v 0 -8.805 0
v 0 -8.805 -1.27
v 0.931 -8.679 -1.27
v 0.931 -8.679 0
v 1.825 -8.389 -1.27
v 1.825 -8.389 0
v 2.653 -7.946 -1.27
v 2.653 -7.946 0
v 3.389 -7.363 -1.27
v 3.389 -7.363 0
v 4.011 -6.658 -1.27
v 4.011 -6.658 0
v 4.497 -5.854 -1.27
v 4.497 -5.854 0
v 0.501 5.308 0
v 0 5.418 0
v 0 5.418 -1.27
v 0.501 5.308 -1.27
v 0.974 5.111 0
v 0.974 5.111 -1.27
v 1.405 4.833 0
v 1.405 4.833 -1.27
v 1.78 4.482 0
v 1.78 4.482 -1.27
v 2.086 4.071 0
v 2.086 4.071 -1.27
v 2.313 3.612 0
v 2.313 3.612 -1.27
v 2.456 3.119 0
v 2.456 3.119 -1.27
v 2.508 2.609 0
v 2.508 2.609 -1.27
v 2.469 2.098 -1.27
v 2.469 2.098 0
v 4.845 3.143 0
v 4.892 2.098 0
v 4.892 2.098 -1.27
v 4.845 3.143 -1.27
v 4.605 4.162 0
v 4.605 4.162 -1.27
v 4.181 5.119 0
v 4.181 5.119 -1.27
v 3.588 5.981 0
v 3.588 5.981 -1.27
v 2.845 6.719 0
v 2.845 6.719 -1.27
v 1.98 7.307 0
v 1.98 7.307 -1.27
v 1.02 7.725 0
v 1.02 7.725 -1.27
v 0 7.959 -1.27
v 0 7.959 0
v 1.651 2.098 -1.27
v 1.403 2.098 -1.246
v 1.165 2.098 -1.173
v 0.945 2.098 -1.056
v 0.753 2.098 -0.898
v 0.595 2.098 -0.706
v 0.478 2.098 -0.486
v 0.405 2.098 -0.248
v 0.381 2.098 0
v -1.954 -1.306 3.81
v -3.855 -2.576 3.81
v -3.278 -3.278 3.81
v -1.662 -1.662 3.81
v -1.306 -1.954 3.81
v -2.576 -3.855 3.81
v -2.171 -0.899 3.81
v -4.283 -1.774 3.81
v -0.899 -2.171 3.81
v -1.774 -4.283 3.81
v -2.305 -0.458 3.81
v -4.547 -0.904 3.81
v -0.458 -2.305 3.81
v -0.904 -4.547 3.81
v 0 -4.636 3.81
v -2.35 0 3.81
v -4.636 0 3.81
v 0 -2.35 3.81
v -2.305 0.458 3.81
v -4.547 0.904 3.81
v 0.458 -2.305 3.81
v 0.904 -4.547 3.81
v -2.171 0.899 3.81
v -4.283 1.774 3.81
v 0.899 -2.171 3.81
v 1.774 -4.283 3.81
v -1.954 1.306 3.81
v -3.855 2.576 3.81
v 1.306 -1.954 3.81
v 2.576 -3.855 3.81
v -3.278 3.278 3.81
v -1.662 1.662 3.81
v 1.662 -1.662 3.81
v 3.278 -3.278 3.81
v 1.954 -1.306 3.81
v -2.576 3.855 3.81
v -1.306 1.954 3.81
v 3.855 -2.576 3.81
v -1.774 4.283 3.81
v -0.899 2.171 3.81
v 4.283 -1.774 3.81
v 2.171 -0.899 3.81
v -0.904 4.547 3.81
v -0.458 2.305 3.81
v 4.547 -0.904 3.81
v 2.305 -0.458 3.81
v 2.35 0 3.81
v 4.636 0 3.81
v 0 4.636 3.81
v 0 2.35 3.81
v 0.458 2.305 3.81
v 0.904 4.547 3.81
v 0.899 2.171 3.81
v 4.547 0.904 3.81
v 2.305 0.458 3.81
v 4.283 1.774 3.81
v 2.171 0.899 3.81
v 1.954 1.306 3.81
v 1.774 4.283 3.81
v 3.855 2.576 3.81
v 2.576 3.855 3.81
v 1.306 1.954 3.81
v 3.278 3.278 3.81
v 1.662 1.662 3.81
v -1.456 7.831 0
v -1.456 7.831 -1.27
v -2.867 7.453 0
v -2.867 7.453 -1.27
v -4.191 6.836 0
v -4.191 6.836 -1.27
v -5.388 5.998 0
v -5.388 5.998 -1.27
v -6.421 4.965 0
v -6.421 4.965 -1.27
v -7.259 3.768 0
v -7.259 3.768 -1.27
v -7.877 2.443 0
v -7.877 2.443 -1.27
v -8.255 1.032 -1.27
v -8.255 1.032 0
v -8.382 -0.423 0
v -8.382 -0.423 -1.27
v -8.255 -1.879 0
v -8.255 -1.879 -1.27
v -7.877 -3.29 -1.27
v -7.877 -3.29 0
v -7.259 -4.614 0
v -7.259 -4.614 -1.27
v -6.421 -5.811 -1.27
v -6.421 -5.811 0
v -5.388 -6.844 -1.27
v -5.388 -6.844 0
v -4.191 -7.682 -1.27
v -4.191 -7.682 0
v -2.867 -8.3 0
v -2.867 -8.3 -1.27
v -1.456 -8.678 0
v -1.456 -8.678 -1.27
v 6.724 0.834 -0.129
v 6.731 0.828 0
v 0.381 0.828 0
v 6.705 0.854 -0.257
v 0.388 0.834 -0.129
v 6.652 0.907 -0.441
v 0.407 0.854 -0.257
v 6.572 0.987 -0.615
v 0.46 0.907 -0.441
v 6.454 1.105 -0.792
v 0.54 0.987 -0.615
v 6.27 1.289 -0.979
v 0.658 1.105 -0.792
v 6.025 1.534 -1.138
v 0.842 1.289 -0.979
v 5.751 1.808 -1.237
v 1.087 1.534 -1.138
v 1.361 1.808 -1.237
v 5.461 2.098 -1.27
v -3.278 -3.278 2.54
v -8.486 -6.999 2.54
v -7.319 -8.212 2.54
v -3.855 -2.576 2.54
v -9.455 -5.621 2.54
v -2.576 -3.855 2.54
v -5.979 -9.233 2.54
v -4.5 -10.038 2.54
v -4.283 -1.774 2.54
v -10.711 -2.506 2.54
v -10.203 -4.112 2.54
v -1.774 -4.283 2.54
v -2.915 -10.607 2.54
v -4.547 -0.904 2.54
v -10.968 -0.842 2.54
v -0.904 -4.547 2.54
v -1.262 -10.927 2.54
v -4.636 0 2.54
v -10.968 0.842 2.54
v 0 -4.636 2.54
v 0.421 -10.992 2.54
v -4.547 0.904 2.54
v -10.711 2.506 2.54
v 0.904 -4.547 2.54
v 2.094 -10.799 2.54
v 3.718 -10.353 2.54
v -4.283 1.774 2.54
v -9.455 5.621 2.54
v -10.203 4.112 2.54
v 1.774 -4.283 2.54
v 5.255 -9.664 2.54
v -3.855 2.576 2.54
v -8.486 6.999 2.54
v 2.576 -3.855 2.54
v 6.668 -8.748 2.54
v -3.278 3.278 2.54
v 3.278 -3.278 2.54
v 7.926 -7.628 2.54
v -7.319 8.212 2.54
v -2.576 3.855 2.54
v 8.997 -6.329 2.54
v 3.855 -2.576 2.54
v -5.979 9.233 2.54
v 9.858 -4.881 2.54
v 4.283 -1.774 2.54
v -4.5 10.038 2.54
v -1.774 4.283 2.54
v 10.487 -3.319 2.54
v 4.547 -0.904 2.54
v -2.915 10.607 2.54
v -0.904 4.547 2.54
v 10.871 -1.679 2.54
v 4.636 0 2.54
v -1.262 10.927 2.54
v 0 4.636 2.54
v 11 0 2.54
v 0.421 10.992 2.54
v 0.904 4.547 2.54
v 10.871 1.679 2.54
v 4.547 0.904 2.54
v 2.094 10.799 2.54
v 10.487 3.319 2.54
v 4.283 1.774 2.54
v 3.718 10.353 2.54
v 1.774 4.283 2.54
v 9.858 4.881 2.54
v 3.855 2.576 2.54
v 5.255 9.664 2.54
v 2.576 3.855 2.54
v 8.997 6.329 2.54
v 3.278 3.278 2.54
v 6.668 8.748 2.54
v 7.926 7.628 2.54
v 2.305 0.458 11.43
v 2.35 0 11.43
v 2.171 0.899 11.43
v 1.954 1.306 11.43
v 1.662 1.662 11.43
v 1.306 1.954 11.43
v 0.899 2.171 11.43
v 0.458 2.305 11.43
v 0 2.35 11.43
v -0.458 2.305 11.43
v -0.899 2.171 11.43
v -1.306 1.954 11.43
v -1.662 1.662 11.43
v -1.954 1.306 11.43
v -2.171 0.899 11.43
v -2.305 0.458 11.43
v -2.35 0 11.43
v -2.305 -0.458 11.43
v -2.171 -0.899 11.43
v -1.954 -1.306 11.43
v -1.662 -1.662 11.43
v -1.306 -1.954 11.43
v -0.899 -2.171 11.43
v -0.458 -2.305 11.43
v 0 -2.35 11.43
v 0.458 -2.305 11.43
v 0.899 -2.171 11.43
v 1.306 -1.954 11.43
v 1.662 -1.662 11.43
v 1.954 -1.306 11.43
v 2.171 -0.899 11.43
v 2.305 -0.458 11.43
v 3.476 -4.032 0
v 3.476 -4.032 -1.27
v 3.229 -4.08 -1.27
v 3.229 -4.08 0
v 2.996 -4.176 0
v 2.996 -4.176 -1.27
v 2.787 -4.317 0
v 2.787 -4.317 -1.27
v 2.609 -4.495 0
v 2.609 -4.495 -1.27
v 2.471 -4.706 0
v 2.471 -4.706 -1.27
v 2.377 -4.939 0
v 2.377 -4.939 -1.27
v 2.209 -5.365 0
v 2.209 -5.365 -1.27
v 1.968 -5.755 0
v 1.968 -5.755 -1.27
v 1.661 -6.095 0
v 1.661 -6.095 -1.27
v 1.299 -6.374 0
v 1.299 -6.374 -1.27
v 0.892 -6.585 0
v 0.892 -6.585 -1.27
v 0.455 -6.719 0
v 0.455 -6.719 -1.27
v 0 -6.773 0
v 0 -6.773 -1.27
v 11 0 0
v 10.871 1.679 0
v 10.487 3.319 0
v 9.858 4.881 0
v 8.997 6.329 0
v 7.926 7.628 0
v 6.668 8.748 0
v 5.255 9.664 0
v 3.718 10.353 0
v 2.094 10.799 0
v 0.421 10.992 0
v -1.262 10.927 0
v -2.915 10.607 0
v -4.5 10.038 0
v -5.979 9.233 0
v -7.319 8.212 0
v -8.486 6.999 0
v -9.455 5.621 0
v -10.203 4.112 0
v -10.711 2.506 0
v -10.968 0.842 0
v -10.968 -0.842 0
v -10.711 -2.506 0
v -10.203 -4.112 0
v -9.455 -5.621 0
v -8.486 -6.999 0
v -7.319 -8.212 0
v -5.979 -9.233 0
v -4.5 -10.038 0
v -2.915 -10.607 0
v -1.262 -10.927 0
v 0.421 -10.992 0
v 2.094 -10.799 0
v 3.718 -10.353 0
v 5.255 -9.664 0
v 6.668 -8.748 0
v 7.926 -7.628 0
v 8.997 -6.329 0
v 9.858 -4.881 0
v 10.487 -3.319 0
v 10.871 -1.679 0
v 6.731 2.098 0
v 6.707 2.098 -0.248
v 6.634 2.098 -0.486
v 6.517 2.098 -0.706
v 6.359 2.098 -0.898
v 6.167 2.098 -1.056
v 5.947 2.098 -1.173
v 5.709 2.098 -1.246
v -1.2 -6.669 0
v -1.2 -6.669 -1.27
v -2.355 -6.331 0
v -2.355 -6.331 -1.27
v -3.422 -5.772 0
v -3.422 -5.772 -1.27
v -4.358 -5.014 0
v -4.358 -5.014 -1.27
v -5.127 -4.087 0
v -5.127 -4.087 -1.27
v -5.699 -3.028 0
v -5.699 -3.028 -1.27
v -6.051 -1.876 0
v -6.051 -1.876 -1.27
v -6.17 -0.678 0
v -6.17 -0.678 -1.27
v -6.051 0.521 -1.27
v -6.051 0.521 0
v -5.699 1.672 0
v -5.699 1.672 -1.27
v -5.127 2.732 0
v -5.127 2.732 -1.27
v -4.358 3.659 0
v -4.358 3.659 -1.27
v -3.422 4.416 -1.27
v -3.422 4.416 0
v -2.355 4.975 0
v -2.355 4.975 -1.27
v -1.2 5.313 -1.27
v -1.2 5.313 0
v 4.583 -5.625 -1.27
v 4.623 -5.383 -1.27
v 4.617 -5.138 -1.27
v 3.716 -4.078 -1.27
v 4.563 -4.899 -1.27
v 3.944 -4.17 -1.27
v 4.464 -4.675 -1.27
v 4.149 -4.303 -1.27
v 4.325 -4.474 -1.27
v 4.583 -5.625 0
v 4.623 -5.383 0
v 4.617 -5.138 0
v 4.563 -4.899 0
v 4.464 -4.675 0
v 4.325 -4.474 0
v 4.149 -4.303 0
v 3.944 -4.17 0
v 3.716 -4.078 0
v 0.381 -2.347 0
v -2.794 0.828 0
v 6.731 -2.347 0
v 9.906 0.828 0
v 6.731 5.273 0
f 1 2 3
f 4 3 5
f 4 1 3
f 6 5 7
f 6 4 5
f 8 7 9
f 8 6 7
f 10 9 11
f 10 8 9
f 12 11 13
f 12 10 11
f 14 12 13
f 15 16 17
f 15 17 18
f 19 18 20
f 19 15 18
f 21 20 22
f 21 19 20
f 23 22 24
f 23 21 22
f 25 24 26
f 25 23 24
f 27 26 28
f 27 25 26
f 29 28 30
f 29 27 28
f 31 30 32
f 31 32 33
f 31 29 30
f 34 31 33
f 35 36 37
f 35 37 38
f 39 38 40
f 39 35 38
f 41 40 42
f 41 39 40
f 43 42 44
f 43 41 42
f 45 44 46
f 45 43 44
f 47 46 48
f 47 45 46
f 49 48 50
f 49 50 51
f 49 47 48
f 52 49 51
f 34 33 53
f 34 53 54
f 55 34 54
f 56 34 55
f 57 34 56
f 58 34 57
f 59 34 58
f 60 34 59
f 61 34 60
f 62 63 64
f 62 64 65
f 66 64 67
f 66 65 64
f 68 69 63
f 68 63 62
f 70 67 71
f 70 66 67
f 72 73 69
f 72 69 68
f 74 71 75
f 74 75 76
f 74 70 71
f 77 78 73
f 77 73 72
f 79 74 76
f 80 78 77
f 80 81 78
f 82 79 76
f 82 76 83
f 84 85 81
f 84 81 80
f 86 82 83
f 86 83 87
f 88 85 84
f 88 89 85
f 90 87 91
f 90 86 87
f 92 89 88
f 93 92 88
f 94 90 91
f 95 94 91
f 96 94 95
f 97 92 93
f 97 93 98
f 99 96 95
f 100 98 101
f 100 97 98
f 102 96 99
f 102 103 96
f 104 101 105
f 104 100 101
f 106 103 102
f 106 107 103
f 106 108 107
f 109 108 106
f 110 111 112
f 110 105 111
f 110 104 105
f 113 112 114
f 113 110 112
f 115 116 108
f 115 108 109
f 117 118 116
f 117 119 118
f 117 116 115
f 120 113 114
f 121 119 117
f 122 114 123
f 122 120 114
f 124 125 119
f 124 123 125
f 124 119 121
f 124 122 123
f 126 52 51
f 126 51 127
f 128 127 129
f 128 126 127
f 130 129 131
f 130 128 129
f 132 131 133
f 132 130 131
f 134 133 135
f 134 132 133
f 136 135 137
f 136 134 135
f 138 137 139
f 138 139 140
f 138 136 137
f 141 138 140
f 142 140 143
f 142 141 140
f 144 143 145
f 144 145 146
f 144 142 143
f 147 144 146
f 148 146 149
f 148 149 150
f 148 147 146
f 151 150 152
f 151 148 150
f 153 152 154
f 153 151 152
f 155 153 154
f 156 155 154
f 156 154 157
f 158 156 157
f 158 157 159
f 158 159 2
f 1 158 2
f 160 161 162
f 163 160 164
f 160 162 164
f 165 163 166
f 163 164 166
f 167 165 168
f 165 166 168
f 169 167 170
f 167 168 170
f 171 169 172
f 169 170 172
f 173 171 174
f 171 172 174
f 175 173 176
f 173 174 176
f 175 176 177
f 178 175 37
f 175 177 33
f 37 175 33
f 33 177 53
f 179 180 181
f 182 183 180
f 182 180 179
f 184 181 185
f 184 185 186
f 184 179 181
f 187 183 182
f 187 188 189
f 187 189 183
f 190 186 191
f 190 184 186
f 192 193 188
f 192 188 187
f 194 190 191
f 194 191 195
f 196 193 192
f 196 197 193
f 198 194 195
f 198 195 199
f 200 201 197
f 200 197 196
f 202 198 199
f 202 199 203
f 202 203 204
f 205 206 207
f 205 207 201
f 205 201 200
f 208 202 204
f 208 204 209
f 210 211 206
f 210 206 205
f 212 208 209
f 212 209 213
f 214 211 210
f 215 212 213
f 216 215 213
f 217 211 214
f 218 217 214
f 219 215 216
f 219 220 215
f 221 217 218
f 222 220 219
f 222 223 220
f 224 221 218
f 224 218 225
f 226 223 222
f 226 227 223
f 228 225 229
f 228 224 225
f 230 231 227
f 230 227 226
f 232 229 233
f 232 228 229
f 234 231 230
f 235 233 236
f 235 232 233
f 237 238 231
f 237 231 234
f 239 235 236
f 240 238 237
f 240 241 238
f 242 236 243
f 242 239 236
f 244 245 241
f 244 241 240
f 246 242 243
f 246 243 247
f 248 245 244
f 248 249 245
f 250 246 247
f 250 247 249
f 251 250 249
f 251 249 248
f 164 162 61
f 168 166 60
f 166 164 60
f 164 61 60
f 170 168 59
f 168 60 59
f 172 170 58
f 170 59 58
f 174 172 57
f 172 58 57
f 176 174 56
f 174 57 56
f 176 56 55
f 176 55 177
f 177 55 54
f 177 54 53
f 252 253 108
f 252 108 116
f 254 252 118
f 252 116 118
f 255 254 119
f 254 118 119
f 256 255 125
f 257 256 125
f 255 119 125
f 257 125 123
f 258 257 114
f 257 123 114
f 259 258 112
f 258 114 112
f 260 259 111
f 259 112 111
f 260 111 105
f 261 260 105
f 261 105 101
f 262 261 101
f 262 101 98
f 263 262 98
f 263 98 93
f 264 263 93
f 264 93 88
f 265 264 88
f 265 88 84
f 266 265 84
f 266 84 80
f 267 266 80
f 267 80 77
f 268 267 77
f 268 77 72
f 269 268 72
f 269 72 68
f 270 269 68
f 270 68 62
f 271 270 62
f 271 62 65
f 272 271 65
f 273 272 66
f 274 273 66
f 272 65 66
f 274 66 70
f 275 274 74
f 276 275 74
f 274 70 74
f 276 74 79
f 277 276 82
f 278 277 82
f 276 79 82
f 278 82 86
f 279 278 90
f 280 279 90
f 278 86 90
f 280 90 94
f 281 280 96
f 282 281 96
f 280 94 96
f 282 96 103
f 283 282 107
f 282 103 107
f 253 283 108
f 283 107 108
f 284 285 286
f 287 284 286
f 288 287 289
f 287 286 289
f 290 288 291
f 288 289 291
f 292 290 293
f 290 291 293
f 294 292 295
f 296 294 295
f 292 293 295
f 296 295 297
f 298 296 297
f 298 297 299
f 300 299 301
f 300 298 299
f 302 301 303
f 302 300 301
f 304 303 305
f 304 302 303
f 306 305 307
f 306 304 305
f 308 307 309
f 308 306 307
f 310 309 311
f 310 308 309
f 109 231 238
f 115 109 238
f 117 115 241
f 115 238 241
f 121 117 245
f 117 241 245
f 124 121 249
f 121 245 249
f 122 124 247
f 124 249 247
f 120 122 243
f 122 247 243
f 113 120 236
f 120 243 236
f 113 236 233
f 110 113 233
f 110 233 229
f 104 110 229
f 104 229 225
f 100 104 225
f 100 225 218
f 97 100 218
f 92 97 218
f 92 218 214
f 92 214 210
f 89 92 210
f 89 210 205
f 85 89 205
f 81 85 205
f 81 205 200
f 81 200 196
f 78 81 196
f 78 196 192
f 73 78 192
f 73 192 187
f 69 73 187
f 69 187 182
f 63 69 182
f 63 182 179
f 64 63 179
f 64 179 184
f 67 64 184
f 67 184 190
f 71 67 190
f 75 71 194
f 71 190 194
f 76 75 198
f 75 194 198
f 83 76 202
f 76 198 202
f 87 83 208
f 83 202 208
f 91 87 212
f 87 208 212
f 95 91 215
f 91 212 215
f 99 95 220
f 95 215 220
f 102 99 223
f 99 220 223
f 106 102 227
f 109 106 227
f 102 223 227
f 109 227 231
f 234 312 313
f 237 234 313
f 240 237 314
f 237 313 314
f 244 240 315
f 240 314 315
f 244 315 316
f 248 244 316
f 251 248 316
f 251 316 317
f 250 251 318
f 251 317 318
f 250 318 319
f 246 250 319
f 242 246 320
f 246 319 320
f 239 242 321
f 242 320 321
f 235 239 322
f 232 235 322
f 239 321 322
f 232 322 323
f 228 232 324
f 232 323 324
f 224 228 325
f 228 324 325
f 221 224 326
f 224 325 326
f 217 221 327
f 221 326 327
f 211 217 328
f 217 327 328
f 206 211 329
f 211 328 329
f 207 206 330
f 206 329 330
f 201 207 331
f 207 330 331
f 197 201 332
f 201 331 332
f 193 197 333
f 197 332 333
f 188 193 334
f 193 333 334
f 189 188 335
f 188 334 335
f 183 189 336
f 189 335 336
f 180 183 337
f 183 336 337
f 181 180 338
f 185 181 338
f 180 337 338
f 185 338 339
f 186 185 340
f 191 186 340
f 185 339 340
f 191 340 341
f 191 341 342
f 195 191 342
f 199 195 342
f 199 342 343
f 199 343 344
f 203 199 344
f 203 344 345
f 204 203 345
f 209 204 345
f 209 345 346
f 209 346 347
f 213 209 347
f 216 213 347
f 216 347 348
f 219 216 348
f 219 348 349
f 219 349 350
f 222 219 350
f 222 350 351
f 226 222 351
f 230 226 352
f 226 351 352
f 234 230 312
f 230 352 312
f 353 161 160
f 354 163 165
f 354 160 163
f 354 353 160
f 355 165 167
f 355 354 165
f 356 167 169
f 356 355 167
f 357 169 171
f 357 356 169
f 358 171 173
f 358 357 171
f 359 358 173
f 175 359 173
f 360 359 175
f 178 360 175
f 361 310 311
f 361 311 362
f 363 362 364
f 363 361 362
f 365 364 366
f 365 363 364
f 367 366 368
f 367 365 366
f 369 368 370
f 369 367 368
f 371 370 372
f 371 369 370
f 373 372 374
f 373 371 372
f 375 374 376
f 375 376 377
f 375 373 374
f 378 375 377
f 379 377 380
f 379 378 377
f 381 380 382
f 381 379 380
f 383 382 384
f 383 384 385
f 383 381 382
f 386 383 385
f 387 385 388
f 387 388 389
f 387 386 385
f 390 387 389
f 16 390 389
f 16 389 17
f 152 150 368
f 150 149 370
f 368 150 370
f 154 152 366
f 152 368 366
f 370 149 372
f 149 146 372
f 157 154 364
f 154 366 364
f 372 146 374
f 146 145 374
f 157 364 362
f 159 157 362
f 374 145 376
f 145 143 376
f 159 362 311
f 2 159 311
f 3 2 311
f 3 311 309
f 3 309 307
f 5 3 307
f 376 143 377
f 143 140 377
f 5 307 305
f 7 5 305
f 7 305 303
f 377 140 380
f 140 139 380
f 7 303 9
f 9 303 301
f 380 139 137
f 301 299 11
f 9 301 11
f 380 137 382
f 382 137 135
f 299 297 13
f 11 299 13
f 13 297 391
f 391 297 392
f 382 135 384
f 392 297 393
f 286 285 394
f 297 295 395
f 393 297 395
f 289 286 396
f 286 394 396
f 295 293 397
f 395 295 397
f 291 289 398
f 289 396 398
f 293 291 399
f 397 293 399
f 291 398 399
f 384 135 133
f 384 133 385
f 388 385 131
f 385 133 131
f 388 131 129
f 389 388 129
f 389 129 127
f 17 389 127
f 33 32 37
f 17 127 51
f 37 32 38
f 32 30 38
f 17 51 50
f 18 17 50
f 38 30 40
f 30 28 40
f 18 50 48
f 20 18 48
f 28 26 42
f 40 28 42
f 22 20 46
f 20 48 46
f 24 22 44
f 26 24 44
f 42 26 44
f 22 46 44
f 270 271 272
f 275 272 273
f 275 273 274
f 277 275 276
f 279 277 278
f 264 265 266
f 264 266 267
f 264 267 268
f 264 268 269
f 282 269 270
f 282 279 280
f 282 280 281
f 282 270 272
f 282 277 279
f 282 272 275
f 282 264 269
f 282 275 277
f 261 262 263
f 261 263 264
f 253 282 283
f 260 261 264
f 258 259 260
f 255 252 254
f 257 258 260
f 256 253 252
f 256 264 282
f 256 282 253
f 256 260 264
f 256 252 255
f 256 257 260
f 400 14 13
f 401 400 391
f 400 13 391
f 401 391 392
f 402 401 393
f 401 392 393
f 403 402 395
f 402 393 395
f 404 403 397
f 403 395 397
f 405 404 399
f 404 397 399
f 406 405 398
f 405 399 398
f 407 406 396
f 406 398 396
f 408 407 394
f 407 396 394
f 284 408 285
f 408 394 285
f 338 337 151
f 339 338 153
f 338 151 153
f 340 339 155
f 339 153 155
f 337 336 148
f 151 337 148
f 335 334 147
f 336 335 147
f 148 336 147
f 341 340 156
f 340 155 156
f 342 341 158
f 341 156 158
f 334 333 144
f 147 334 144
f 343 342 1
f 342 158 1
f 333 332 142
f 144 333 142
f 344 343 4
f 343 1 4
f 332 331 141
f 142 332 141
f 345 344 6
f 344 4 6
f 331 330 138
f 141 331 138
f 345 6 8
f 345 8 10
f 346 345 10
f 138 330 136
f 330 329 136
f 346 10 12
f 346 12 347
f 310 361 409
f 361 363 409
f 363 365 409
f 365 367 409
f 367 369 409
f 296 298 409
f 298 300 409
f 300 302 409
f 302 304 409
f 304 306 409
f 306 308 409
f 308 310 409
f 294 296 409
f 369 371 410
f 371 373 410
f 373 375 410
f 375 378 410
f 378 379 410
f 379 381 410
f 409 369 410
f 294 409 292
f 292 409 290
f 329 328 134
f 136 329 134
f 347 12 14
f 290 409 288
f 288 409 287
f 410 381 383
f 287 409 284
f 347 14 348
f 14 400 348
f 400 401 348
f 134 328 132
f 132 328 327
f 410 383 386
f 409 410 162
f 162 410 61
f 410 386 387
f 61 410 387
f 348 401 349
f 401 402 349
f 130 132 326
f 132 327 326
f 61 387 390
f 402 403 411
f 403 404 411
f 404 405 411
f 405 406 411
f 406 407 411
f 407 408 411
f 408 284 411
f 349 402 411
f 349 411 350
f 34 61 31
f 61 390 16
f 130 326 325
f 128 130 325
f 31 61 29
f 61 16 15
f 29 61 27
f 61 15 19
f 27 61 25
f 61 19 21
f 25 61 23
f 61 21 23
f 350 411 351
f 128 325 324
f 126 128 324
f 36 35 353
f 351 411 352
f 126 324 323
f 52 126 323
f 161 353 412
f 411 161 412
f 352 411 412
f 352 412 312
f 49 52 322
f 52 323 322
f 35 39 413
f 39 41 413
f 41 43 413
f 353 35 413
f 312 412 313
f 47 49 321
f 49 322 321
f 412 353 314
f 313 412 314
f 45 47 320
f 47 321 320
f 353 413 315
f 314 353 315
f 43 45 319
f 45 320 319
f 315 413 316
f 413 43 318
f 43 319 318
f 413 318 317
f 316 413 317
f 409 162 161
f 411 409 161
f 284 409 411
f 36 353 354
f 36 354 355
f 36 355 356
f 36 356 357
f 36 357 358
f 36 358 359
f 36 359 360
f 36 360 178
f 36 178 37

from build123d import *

# Parameters (mm, degrees)
F0_R        = 2.35
F1_DEPTH    = 11.43
F0_R_2      = 4.636
F2_DEPTH    = 3.81
F0_R_3      = 11
F3_DEPTH    = 2.54
F5_DEPTH    = 1.27
F6_T1_DEPTH = 12.7
F6_T3_DEPTH = 7.62
F6_T5_DEPTH = 4.445
F6_T7_DEPTH = 4.079017898
F6_T9_DEPTH = 6.0188206533


# Not quite as in the source:
# - a fillet or chamfer that OpenCascade refuses, or shapes differently, is made with other operations: its cross-section is extruded or revolved along the edge and cut away or added


with BuildPart() as f1:
    # F0 (on Top) → F1 (new body)
    with BuildSketch(Plane.XY):
        Circle(F0_R)
    extrude(amount=F1_DEPTH)

    # F0 (on Top) → F2 (join)
    with BuildSketch(Plane.XY):
        Circle(F0_R_2)
        Circle(F0_R, mode=Mode.SUBTRACT)
    extrude(amount=F2_DEPTH)

    # F0 (on Top) → F3 (join)
    with BuildSketch(Plane.XY):
        Circle(F0_R_3)
        Circle(F0_R_2, mode=Mode.SUBTRACT)
    extrude(amount=F3_DEPTH)

    # F4 (on face) → F5 (join)
    with BuildSketch(Plane.XY):
        with BuildLine():
            ThreePointArc((0, -6.7733326328), (-6.1696334492, -0.6777773574), (0, 5.417777918))
            ThreePointArc((0, 5.417777918), (1.9417265012, 4.2834880284), (2.4694073737, 2.0975172472))
            Line((2.4694073737, 2.0975172472), (4.8922184175, 2.0975172472))
            ThreePointArc((4.8922184175, 2.0975172472), (3.5875761059, 5.9808584475), (0, 7.9586673672))
            ThreePointArc((0, 7.9586673672), (-8.382, -0.4233326328), (0, -8.8053326328))
            ThreePointArc((0, -8.8053326328), (3.39954986, -7.3527295439), (5.0117596984, -4.0259030648))
            Line((5.0117596984, -4.0259030648), (2.4717596984, -4.0259030648))
            ThreePointArc((2.4717596984, -4.0259030648), (1.8244333866, -5.9291174694), (0, -6.7733326328))
        make_face()
        with BuildLine():
            Line((4.8922184175, 2.0975172472), (2.4694073737, 2.0975172472))
            ThreePointArc((2.4694073737, 2.0975172472), (2.3960471942, 1.7747190007), (2.2859995271, 1.4625172472))
            Line((2.2859995271, 1.4625172472), (4.8259995271, 1.4625172472))
            ThreePointArc((4.8259995271, 1.4625172472), (4.8680955625, 1.7790801102), (4.8922184175, 2.0975172472))
        make_face()
        with BuildLine():
            ThreePointArc((2.2859995271, 1.4625172472), (2.3960471942, 1.7747190007), (2.4694073737, 2.0975172472))
            Line((2.4694073737, 2.0975172472), (0.3809995271, 2.0975172472))
            Line((0.3809995271, 2.0975172472), (0.3809995271, 0.8275172472))
            Line((0.3809995271, 0.8275172472), (6.7309995271, 0.8275172472))
            Line((6.7309995271, 0.8275172472), (6.7309995271, 2.0975172472))
            Line((6.7309995271, 2.0975172472), (4.8922184175, 2.0975172472))
            ThreePointArc((4.8922184175, 2.0975172472), (4.8680955625, 1.7790801102), (4.8259995271, 1.4625172472))
            Line((4.8259995271, 1.4625172472), (2.2859995271, 1.4625172472))
        make_face()
    extrude(amount=-F5_DEPTH)

    # F6: fillet of radius 1.27 on 5 edges, made by hand

    # F6_s2 → F6_t1 (cut)
    with BuildSketch(Plane.YZ.offset(-2.7940004729)):
        with BuildLine():
            ThreePointArc((0.8275172472, 0), (1.1994916351, -0.8980256121), (2.0975172472, -1.27))
            Line((2.0975172472, -1.27), (0.8275172472, -1.27))
            Line((0.8275172472, -1.27), (0.8275172472, 0))
        make_face()
    extrude(amount=F6_T1_DEPTH, mode=Mode.SUBTRACT)

    # F6_s4 → F6_t3 (cut)
    with BuildSketch(Plane.XZ.offset(-5.2725172472)):
        with BuildLine():
            ThreePointArc((6.7309995271, 0), (6.3590251392, -0.8980256121), (5.4609995271, -1.27))
            Line((5.4609995271, -1.27), (6.7309995271, -1.27))
            Line((6.7309995271, -1.27), (6.7309995271, 0))
        make_face()
    extrude(amount=F6_T3_DEPTH, mode=Mode.SUBTRACT)

    # F6_s6 → F6_t5 (cut)
    with BuildSketch(Plane.XZ.offset(-2.0975172472)):
        with BuildLine():
            ThreePointArc((0.3809995271, 0), (0.752973915, -0.8980256121), (1.6509995271, -1.27))
            Line((1.6509995271, -1.27), (0.3809995271, -1.27))
            Line((0.3809995271, -1.27), (0.3809995271, 0))
        make_face()
    extrude(amount=F6_T5_DEPTH, mode=Mode.SUBTRACT)

    # F6_s8 → F6_t7 (cut)
    with BuildSketch(Plane.XY.offset(-4.079017898)):
        with BuildLine():
            ThreePointArc((3.5953668576, -4.0259030648), (2.8338642738, -4.2795301928), (2.3765155692, -4.9391096556))
            ThreePointArc((2.3765155692, -4.9391096556), (2.4655394537, -4.4868244195), (2.4717596984, -4.0259030648))
            Line((2.4717596984, -4.0259030648), (3.5953668576, -4.0259030648))
        make_face()
    extrude(amount=F6_T7_DEPTH, mode=Mode.SUBTRACT)

    # F6_s10 → F6_t9 (cut)
    with BuildSketch(Plane.XY.offset(-6.0188206533)):
        with BuildLine():
            ThreePointArc((4.4971207542, -5.8543872382), (4.4340465678, -4.6237330343), (3.3565088886, -4.0259030648))
            Line((3.3565088886, -4.0259030648), (5.0117596984, -4.0259030648))
            ThreePointArc((5.0117596984, -4.0259030648), (4.837388646, -4.9634915319), (4.4971207542, -5.8543872382))
        make_face()
    extrude(amount=F6_T9_DEPTH, mode=Mode.SUBTRACT)


solid = f1.part
